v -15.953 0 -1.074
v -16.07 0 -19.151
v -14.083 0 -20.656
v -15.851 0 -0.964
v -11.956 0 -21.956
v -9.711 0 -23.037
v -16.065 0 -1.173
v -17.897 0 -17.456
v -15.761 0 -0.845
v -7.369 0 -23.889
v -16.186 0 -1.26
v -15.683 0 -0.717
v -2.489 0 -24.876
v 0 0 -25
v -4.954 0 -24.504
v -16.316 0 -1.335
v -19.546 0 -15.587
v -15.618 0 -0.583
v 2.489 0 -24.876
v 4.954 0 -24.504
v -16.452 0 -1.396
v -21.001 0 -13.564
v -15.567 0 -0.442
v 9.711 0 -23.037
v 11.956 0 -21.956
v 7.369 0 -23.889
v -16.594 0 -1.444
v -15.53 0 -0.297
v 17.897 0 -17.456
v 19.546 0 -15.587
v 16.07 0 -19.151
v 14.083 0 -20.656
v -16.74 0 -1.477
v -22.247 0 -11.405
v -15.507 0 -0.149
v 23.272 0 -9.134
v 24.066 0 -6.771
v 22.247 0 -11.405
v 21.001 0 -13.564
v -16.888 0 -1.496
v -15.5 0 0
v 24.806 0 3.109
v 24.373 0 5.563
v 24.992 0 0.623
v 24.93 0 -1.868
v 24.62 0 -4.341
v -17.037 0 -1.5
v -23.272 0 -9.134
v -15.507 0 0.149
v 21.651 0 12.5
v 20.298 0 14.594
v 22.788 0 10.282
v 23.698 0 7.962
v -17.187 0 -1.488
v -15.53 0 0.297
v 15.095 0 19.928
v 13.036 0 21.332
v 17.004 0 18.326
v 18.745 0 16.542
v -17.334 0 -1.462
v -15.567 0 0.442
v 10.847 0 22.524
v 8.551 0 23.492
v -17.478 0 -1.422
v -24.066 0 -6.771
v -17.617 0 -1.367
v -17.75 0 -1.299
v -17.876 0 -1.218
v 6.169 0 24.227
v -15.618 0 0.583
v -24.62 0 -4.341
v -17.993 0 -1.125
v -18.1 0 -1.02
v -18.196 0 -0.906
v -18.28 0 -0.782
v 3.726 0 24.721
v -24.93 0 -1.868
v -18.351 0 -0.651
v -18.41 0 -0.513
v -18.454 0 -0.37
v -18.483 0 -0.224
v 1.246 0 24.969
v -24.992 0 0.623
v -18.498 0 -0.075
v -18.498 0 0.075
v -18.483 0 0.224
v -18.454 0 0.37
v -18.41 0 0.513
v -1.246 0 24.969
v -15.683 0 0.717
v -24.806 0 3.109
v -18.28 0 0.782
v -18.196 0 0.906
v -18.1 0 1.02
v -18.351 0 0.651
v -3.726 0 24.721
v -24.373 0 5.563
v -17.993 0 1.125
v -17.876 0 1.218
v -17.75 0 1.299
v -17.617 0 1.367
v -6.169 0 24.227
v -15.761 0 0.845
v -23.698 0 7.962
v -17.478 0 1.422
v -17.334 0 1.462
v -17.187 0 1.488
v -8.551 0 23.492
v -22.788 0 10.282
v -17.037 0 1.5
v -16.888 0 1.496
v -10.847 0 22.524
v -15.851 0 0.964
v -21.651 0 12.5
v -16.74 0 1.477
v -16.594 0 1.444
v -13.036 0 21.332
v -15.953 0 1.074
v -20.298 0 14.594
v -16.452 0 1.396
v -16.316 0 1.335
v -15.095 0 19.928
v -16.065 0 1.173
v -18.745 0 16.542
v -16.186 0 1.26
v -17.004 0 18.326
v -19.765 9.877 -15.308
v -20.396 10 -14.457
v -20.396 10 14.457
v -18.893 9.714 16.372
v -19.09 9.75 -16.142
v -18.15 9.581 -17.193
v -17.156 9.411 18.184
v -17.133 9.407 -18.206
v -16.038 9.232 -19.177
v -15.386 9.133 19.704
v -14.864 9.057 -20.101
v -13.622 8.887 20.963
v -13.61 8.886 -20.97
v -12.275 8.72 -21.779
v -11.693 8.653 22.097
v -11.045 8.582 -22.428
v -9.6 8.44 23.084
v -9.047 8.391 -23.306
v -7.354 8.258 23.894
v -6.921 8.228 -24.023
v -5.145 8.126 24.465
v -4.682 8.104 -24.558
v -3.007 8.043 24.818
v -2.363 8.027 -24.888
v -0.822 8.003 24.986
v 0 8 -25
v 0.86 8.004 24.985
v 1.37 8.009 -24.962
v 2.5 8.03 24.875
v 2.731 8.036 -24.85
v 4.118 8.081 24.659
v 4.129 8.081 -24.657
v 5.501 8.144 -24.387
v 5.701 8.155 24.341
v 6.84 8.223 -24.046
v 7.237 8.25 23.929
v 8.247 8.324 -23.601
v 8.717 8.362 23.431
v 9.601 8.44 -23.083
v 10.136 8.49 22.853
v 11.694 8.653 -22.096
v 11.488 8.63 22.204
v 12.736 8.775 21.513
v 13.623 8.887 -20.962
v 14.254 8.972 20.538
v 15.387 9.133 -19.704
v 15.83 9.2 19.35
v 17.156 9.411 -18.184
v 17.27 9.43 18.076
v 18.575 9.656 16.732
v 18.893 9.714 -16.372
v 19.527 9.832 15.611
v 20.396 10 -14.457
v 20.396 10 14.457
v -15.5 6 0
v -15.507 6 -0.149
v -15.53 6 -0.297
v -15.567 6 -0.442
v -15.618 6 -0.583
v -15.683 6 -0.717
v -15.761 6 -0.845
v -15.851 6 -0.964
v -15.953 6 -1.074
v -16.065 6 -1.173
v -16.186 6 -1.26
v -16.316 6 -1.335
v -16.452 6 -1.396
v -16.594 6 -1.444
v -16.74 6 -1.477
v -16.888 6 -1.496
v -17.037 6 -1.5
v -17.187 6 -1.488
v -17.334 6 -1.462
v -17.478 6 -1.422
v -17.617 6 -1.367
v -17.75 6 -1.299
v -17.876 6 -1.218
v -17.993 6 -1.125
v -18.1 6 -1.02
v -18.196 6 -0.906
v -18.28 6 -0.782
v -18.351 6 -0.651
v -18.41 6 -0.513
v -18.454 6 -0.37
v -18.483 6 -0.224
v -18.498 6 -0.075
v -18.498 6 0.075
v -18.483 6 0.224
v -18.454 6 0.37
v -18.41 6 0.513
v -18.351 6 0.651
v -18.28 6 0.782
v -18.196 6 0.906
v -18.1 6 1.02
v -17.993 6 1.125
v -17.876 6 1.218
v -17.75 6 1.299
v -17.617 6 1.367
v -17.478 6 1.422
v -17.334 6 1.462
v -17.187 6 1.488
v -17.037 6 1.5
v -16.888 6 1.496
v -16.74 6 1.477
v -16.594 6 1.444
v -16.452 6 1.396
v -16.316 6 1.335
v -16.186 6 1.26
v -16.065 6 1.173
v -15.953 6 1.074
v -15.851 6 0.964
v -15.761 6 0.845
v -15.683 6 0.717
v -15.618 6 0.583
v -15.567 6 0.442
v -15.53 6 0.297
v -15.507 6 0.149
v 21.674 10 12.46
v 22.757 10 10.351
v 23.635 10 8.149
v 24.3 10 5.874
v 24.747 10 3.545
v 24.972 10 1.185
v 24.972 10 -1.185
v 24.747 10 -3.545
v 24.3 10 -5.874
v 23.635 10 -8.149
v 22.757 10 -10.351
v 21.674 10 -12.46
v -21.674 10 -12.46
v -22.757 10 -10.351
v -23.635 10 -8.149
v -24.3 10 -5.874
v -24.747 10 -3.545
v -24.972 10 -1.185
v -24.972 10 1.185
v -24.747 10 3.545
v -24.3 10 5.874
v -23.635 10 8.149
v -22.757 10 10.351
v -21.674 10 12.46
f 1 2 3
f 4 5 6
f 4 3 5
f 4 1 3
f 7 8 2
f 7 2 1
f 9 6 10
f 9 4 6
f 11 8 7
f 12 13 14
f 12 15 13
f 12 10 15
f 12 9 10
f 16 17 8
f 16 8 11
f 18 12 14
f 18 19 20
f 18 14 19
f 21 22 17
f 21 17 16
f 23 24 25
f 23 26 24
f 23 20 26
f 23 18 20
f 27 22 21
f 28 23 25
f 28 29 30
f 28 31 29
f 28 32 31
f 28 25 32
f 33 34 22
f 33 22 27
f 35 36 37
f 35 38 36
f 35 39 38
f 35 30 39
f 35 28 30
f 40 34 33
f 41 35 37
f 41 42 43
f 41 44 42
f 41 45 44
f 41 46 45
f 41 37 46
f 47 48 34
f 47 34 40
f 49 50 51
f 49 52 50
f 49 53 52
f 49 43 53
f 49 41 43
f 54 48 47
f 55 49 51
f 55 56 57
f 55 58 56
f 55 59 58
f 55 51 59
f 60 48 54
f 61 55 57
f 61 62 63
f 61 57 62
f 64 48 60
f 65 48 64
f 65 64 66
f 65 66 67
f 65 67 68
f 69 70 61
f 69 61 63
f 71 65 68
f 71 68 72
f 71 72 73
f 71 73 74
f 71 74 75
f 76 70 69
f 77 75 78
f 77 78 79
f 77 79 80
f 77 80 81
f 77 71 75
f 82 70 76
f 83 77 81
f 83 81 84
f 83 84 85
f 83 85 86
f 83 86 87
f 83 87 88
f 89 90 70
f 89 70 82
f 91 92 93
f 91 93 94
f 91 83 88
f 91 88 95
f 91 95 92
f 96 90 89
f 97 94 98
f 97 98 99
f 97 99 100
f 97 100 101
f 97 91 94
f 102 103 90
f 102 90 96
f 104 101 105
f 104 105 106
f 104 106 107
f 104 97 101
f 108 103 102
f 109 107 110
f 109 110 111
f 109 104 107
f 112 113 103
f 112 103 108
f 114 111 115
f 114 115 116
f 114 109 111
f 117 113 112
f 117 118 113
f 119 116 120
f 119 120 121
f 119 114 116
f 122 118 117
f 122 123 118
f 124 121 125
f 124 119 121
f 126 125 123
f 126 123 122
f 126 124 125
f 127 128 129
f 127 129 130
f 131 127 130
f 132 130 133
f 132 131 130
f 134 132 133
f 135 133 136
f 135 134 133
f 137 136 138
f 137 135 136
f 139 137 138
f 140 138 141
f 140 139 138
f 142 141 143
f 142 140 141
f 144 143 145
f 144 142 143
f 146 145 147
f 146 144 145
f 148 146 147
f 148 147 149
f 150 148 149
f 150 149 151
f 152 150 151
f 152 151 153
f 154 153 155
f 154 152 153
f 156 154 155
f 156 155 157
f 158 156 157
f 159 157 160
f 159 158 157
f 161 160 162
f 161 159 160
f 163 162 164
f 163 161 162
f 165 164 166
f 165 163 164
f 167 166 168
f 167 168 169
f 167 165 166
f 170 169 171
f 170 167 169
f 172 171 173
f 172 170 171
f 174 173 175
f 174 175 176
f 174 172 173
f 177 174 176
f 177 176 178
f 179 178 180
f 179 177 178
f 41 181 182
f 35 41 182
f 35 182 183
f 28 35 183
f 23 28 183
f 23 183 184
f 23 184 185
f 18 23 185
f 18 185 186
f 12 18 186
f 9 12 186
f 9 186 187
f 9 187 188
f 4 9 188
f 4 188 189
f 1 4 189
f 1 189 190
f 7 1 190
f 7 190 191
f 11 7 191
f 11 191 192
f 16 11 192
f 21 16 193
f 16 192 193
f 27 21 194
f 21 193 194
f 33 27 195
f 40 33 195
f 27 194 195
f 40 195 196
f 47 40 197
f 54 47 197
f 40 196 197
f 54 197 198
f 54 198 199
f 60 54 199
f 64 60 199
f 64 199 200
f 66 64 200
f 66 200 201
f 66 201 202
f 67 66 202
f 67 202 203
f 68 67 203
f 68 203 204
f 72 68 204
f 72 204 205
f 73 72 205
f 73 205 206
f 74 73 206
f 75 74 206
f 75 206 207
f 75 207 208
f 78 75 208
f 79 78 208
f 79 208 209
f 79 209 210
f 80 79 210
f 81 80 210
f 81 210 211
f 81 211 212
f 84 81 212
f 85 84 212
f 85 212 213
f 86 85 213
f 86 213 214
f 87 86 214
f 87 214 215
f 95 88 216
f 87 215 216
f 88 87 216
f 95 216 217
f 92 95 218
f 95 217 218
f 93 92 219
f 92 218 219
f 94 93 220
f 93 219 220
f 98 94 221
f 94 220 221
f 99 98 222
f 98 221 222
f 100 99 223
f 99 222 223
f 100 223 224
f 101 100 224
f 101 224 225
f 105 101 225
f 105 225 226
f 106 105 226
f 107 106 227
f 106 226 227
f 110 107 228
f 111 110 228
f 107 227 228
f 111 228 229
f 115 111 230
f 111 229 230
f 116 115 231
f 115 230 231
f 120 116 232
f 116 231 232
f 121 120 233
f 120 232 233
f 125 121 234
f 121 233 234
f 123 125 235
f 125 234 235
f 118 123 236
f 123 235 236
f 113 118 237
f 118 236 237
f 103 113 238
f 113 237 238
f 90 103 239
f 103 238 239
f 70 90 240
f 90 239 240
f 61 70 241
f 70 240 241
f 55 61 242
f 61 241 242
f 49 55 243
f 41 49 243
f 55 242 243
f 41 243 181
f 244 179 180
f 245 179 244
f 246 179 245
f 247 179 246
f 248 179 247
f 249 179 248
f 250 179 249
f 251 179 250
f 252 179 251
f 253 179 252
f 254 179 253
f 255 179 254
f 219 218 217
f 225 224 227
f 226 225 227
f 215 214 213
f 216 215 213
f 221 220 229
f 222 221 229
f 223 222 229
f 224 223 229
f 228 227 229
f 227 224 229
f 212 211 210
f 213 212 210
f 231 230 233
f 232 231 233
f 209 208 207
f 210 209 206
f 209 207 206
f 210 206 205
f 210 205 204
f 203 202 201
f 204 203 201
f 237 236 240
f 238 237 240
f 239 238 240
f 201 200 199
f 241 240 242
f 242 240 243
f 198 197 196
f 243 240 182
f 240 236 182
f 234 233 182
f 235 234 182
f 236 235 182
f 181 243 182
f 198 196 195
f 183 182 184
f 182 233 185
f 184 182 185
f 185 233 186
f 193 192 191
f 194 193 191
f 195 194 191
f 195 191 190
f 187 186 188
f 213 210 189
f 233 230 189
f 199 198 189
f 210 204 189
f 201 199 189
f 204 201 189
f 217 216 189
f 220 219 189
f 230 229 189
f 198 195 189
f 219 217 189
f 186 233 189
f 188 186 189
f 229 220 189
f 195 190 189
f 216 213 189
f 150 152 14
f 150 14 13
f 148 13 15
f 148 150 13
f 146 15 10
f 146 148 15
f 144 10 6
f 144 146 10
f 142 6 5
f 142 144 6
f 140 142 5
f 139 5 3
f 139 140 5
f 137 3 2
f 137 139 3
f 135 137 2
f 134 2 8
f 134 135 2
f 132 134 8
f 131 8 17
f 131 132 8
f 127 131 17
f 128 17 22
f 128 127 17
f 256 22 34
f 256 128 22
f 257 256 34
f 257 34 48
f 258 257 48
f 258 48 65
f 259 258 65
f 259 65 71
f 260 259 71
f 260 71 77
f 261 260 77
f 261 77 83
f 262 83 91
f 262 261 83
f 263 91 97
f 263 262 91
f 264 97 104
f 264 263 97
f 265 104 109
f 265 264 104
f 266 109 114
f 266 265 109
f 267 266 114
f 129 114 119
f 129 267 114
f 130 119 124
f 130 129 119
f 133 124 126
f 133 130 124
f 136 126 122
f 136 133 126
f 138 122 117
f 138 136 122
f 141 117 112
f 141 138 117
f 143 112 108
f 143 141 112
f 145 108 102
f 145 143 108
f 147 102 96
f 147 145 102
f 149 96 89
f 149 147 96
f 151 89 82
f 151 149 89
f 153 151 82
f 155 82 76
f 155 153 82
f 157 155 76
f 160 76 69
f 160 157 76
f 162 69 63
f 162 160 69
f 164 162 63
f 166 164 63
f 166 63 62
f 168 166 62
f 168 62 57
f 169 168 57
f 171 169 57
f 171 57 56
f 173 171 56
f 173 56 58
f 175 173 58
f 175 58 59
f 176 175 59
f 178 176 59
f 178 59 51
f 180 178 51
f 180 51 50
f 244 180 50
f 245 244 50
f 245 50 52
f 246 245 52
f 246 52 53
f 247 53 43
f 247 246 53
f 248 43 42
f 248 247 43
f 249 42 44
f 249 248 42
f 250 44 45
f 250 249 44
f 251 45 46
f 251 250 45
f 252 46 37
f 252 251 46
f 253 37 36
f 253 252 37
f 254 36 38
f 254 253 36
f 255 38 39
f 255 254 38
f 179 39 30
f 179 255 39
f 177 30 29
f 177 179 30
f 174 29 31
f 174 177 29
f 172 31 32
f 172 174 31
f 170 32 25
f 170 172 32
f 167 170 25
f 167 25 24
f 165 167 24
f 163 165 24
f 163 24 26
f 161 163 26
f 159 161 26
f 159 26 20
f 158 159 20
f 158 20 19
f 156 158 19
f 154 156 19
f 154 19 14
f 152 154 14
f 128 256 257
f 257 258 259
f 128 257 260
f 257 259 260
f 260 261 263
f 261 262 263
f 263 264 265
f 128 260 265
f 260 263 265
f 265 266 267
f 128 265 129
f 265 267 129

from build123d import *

# Parameters (mm, degrees)
SKETCH1_W                 = 25
SKETCH1_H                 = 10
CUT_EXTRUDE1_DEPTH        = 37.742346142
CUT_EXTRUDE1_DEPTH_BACK   = 37.742346142
SKETCH2_R                 = 105
F_3_0MM_DOWEL_HOLE1_D     = 3
F_3_0MM_DOWEL_HOLE1_DEPTH = 6


with BuildPart() as part:
    # Sketch1 → Revolve1 (revolve)
    with BuildSketch(Plane.XY, mode=Mode.PRIVATE) as revolve1_sk:
        with Locations((12.5, 5)):
            Rectangle(SKETCH1_W, SKETCH1_H)
    revolve(revolve1_sk.sketch.rotate(Axis((0, 0, 0), (0, 1, 0)), 90), axis=Axis((0, 0, 0), (0, 1, 0)))

    # Sketch2 → Cut-Extrude1 (cut, two sides: drawn at the far end of the back side and taken through both)
    with BuildSketch(Plane.XY.offset(-CUT_EXTRUDE1_DEPTH_BACK)):
        with Locations((0, 113)):
            Circle(SKETCH2_R)
    extrude(amount=CUT_EXTRUDE1_DEPTH + CUT_EXTRUDE1_DEPTH_BACK, mode=Mode.SUBTRACT)

    # Ø3.0mm Dowel Hole1
    with Locations(Plane(origin=(0, 0, 0), x_dir=(-1, 0, 0), z_dir=(0, -1, 0))):
        with Locations((17, 0)):
            Hole(F_3_0MM_DOWEL_HOLE1_D / 2, depth=F_3_0MM_DOWEL_HOLE1_DEPTH)


solid = part.part
